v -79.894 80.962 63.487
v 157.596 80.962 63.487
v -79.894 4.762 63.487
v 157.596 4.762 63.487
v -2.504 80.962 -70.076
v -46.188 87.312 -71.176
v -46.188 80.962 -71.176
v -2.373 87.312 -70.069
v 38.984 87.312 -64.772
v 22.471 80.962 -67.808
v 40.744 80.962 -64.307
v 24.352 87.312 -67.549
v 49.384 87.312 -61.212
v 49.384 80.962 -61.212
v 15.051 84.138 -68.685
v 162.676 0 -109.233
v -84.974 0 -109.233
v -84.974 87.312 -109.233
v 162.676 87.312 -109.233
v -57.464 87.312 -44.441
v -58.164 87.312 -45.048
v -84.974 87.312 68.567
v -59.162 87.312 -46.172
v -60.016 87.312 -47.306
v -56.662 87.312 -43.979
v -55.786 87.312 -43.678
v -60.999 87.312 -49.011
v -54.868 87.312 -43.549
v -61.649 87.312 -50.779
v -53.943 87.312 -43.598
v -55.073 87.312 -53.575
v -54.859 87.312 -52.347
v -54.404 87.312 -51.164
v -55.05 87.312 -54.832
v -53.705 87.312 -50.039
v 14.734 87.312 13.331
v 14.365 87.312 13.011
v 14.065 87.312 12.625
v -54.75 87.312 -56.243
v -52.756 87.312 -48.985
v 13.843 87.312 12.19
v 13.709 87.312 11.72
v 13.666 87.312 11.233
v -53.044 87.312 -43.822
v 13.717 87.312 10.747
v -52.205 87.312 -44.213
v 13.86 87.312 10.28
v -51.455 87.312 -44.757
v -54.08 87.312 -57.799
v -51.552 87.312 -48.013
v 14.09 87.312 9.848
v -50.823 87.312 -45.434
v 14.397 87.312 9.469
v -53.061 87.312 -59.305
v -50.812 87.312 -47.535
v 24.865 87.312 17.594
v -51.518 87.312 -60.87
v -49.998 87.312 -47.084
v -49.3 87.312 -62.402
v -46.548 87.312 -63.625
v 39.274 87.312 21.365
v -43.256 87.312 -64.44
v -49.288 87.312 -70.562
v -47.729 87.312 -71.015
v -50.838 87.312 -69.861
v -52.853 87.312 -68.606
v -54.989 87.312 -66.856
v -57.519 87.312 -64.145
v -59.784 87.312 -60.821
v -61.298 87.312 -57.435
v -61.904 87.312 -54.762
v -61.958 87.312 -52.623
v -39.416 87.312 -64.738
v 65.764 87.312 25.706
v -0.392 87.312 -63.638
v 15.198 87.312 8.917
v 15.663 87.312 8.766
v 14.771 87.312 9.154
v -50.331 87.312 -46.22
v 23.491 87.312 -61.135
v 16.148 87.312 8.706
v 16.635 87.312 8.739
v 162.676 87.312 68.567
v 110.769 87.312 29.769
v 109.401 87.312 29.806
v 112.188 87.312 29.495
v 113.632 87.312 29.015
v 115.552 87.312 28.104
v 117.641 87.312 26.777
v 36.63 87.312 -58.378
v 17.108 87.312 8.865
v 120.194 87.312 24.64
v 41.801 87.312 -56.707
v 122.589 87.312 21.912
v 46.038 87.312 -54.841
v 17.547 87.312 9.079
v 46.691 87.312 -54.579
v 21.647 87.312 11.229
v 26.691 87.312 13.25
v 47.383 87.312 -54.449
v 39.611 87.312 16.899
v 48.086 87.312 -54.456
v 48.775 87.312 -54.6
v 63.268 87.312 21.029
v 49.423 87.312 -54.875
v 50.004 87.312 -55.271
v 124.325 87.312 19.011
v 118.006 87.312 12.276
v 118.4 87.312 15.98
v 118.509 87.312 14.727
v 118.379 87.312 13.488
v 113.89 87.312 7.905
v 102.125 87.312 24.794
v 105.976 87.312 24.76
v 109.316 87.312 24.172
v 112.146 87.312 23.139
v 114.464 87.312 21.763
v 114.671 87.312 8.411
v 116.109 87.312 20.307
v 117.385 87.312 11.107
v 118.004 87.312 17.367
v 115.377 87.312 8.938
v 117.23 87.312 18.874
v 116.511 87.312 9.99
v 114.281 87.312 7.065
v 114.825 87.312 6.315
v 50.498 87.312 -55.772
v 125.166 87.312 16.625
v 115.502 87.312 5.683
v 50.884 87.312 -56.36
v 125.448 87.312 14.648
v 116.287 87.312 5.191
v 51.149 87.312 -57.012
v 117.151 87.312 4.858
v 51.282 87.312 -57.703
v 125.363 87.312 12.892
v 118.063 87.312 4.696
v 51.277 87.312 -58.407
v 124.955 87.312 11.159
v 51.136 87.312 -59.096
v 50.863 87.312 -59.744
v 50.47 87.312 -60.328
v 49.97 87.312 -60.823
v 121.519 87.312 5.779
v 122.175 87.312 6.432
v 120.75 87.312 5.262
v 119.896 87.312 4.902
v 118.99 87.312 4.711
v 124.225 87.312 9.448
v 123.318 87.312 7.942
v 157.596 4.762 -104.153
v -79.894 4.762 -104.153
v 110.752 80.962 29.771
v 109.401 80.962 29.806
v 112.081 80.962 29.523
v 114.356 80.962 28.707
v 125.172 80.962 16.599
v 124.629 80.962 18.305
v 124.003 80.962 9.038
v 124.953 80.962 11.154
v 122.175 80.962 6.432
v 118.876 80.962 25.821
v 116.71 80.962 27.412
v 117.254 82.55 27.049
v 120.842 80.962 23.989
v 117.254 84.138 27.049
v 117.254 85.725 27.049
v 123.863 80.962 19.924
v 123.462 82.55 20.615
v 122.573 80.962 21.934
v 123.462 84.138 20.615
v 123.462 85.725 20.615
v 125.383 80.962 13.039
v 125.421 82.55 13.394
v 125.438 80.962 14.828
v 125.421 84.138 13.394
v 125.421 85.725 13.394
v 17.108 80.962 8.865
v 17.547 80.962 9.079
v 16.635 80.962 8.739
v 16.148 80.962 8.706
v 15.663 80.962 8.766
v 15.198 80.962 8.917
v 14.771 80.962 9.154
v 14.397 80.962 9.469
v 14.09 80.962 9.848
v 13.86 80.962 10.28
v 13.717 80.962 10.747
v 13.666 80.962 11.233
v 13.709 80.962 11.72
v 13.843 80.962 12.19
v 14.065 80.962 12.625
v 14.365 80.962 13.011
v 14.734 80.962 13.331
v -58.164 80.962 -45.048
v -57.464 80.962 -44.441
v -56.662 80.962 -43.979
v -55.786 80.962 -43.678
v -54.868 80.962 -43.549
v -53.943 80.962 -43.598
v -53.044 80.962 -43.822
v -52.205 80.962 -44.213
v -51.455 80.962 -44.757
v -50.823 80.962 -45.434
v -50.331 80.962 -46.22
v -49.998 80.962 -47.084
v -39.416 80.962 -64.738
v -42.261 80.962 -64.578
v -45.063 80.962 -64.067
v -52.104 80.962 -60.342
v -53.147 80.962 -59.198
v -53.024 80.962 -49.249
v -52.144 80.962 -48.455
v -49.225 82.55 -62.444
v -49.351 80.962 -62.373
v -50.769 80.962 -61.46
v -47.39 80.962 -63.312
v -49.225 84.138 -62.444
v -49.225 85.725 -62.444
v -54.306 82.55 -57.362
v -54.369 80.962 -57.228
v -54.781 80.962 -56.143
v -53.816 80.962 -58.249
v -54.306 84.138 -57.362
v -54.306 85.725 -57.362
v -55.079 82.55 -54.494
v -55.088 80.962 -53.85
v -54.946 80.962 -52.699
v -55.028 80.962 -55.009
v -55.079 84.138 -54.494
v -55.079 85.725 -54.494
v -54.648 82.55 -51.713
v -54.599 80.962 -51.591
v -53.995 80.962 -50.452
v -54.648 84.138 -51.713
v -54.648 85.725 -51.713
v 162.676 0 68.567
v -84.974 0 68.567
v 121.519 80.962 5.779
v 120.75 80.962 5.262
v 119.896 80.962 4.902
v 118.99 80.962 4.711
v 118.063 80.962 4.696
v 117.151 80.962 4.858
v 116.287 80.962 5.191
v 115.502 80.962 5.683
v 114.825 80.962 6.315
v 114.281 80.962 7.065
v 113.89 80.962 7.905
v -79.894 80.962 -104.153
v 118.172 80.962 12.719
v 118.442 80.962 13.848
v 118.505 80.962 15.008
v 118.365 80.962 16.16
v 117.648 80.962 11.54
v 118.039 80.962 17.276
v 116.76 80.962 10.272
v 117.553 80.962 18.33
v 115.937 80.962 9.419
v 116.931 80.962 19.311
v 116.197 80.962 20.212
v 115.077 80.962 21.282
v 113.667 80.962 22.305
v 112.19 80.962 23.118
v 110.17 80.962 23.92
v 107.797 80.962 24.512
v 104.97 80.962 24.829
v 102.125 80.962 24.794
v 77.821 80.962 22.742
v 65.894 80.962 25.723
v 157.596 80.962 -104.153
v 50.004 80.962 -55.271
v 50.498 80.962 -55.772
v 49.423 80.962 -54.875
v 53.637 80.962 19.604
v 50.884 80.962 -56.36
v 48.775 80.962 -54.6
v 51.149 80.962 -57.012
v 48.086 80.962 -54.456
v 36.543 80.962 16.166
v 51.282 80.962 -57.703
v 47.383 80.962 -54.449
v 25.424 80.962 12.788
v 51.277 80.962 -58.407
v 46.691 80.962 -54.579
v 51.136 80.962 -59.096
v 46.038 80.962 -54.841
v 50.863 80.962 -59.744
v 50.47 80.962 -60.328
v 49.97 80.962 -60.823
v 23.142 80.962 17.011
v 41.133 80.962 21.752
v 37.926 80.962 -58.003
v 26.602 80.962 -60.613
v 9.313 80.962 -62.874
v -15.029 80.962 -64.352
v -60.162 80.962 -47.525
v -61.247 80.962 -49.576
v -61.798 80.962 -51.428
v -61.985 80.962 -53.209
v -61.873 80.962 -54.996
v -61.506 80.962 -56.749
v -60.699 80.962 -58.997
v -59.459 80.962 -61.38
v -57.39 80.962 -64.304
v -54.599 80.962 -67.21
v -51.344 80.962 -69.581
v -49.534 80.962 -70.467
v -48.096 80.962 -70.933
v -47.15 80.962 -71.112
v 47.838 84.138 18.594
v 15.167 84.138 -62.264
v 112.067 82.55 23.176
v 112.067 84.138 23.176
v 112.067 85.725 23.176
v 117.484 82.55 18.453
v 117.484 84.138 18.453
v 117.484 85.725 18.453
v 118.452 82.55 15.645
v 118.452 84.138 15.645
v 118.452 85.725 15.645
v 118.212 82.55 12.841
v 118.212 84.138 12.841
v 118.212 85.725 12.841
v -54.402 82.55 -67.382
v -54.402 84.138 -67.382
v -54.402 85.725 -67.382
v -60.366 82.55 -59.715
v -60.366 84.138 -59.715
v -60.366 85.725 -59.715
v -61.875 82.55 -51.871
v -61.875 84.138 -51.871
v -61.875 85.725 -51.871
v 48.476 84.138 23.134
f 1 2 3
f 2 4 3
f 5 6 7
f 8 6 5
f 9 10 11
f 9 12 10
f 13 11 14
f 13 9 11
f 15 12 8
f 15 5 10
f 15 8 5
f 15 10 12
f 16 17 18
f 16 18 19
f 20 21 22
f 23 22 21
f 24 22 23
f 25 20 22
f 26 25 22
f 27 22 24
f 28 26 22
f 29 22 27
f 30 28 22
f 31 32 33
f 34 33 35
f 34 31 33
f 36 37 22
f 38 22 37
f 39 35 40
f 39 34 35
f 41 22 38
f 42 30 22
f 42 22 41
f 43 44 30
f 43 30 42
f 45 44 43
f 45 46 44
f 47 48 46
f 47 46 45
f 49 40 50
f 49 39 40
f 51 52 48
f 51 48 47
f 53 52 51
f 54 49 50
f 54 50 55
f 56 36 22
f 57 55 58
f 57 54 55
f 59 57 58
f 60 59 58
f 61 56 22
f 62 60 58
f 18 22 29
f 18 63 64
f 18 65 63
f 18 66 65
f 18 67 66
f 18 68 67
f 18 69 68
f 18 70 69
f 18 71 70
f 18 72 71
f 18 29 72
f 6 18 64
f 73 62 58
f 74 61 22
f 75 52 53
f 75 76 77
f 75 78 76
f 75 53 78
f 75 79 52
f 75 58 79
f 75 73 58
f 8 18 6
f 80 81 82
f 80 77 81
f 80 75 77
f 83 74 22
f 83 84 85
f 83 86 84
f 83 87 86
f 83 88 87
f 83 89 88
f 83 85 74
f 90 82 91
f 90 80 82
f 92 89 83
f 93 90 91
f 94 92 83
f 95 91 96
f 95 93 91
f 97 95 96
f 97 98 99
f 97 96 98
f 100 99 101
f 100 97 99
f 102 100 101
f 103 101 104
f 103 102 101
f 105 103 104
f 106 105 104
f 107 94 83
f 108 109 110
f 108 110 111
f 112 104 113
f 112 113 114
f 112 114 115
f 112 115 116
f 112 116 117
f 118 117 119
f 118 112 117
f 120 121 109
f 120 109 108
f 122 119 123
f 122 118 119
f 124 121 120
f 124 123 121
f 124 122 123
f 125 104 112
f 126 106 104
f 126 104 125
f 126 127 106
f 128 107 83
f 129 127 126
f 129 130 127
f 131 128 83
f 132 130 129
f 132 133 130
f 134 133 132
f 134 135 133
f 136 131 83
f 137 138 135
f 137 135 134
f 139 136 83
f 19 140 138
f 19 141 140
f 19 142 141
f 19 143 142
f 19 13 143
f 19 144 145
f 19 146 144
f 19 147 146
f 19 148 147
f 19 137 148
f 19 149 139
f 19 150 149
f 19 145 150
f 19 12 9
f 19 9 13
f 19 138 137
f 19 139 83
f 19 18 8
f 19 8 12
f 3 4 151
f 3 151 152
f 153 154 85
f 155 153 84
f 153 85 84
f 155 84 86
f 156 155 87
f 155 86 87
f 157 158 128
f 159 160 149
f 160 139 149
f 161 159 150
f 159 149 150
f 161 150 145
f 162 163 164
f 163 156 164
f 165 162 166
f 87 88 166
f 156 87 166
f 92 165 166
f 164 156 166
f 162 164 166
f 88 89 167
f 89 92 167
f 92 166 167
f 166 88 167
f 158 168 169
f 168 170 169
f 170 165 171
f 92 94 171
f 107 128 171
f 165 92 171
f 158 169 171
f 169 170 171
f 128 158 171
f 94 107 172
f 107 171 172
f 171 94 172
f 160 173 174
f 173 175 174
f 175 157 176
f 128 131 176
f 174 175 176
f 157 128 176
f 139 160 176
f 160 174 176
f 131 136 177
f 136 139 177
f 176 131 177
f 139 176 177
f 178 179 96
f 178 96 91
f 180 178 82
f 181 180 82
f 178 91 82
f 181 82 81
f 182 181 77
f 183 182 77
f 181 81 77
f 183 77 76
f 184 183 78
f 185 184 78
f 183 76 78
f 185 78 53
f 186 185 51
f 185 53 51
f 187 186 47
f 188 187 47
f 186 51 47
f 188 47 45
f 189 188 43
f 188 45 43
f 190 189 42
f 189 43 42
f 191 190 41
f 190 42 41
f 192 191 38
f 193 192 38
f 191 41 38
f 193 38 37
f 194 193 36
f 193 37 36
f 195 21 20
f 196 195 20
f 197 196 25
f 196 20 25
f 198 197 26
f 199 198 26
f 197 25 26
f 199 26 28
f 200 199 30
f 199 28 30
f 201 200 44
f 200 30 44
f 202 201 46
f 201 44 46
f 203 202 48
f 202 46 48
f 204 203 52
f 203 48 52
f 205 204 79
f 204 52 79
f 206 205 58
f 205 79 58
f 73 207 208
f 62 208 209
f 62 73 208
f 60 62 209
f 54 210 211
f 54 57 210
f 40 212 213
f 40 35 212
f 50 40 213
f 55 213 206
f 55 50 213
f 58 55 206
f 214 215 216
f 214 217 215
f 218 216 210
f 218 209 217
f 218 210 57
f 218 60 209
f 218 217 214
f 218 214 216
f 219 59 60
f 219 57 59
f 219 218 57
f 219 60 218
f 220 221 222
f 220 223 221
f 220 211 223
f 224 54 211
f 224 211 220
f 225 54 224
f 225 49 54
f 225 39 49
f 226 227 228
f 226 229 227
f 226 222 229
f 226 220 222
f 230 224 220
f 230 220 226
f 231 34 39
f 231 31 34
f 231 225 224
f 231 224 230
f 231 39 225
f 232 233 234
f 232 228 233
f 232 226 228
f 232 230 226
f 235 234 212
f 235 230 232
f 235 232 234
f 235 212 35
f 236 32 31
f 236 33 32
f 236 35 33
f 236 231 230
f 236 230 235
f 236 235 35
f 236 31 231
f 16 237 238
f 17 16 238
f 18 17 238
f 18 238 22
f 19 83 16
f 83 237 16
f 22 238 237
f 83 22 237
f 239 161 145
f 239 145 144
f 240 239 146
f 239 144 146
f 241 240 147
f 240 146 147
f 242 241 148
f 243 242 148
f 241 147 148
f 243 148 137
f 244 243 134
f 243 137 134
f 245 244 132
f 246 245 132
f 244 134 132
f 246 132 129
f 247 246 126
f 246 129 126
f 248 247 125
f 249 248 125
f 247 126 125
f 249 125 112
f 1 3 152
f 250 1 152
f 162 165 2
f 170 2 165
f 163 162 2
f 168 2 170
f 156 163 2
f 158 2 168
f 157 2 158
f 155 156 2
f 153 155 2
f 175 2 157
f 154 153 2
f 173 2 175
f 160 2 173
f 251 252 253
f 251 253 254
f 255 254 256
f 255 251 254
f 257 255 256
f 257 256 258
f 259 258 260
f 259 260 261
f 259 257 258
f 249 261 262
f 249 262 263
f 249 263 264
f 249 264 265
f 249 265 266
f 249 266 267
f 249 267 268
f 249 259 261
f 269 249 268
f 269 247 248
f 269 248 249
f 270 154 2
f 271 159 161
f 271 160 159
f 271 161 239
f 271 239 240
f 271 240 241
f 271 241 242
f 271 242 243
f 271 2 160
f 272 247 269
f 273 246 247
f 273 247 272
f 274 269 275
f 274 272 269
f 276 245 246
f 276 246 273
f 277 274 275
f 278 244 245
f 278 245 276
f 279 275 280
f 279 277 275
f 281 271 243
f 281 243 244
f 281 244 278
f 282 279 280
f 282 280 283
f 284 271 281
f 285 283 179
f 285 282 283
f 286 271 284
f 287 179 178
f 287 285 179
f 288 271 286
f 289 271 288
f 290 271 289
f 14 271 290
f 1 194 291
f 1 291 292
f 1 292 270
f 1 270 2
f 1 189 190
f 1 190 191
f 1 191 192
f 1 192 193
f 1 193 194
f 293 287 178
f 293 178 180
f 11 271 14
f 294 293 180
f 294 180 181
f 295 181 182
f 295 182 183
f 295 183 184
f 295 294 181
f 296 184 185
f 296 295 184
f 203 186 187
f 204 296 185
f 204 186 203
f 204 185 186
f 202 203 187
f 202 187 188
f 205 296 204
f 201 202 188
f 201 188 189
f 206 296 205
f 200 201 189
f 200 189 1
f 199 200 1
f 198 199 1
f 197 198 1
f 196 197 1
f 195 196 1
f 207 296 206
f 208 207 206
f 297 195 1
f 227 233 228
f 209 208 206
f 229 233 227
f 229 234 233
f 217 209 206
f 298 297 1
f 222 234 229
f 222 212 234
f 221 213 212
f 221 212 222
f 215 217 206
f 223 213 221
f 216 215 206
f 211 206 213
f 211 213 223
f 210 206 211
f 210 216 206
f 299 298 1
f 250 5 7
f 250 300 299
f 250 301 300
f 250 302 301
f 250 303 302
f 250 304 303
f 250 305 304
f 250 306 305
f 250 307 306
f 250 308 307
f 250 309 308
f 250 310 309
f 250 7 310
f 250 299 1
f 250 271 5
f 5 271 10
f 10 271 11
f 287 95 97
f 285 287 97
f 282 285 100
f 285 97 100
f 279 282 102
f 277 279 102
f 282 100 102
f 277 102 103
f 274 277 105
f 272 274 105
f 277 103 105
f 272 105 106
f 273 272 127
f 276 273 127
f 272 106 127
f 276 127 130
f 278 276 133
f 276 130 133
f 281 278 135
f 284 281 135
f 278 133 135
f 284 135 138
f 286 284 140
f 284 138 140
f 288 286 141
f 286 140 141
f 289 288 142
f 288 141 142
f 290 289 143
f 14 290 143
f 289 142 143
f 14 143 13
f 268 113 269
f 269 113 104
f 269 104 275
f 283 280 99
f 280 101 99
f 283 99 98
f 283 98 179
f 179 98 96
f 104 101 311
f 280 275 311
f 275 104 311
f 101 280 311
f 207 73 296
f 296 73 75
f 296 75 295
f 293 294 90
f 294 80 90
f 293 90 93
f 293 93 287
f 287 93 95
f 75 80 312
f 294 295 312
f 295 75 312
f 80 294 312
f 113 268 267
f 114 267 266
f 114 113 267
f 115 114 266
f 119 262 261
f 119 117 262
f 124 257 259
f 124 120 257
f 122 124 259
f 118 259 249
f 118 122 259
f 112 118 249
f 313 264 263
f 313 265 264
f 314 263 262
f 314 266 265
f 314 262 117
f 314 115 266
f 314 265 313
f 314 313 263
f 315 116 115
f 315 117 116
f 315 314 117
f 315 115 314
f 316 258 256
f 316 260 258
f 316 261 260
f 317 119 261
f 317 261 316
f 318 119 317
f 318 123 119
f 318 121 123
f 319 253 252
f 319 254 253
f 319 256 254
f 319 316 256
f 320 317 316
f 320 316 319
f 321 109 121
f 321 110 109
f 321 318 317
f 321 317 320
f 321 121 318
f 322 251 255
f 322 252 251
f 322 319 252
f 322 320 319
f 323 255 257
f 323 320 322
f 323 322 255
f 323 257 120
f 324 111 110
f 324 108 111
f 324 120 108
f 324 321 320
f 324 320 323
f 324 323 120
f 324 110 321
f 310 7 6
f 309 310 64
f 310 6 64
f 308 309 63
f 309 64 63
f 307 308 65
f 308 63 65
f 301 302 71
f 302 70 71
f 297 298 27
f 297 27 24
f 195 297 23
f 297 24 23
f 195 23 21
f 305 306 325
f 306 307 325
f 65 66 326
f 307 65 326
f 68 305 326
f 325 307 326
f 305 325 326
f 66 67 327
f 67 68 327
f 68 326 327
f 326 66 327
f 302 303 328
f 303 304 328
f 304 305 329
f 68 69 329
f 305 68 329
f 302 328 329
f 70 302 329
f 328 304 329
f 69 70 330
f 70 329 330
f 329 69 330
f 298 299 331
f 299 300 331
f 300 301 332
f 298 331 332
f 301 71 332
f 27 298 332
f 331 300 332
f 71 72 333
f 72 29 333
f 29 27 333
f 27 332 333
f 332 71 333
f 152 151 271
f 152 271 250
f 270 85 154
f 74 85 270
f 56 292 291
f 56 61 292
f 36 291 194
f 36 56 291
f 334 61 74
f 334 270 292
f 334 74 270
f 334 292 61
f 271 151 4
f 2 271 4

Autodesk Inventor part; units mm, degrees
ref_plane "YZ Plane" through (0, 0, 0) normal (1, 0, 0) x (0, 1, 0)
ref_plane "XZ Plane" through (0, 0, 0) normal (0, 1, 0) x (-1, 0, 0)
sketch "Sketch1" plane through (0, 0, 0) normal (0, 1, 0) x (-1, 0, 0)
  line L0 (84.9737, 68.5674) -> (-162.6763, 68.5674)
  line L1 (-162.6763, 68.5674) -> (-162.6763, -109.2326)
  line L2 (-162.6763, -109.2326) -> (84.9737, -109.2326)
  line L3 (84.9737, -109.2326) -> (84.9737, 68.5674)
  point P0 (0, 0)
  dimension "d0" = 247.65
  dimension "d1" = 177.8
extrude "Extrusion1" add sketch "Sketch1" along normal blind 4.7625
sketch "Sketch2" plane through (0, 4.7625, 0) normal (0, 1, 0) x (1, 0, 0)
  line L0 (-84.9737, 109.2326) -> (-84.9737, -68.5674) projected
  line L1 (162.6763, -68.5674) -> (162.6763, 109.2326) projected
  line L2 (-84.9737, -68.5674) -> (162.6763, -68.5674)
  line L3 (162.6763, -68.5674) -> (162.6763, -63.4874)
  line L4 (162.6763, -63.4874) -> (-84.9737, -63.4874)
  line L5 (-84.9737, -63.4874) -> (-84.9737, -68.5674)
  point P0 (0, 0)
  point P1 (-84.9737, -63.4874)
  dimension "d4" = 5.08
extrude "Extrusion2" add sketch "Sketch2" along normal blind 82.55
sketch "Sketch3" plane through (0, 4.7625, 0) normal (0, 1, 0) x (1, 0, 0)
  line L0 (-84.9737, 109.2326) -> (-84.9737, -68.5674) projected
  line L1 (162.6763, -68.5674) -> (162.6763, 109.2326) projected
  line L2 (-84.9737, 109.2326) -> (162.6763, 109.2326)
  line L3 (162.6763, 109.2326) -> (162.6763, 104.1526)
  line L4 (162.6763, 104.1526) -> (-84.9737, 104.1526)
  line L5 (-84.9737, 104.1526) -> (-84.9737, 109.2326)
  point P0 (0, 0)
  point P1 (-84.9737, 104.1526)
  dimension "d7" = 5.08
extrude "Extrusion3" add sketch "Sketch3" along normal blind 82.55
sketch "Sketch4" plane through (0, 4.7625, 0) normal (0, 1, 0) x (1, 0, 0)
  line L0 (-84.9737, -68.5674) -> (162.6763, -68.5674) projected
  line L1 (162.6763, 109.2326) -> (-84.9737, 109.2326) projected
  line L2 (-84.9737, -68.5674) -> (-79.8937, -68.5674)
  line L3 (-79.8937, -68.5674) -> (-79.8937, 109.2326)
  line L4 (-79.8937, 109.2326) -> (-84.9737, 109.2326)
  line L5 (-84.9737, 109.2326) -> (-84.9737, -68.5674)
  line L6 (162.6763, -68.5674) -> (157.5963, -68.5674)
  line L7 (157.5963, -68.5674) -> (157.5963, 109.2326)
  line L8 (157.5963, 109.2326) -> (162.6763, 109.2326)
  line L9 (162.6763, 109.2326) -> (162.6763, -68.5674)
  point P0 (0, 0)
  dimension "d10" = 5.08
  dimension "d11" = 5.08
extrude "Extrusion4" add sketch "Sketch4" along normal blind 82.55 contours L5 L1 L3 L0
sketch "Sketch5" plane through (0, 4.7625, 0) normal (0, 1, 0) x (1, 0, 0)
  line L0 (162.6763, 109.2326) -> (-84.9737, 109.2326) projected
  line L1 (-84.9737, -68.5674) -> (162.6763, -68.5674) projected
  line L2 (162.6763, 109.2326) -> (157.5963, 109.2326)
  line L3 (157.5963, 109.2326) -> (157.5963, -68.5674)
  line L4 (157.5963, -68.5674) -> (162.6763, -68.5674)
  line L5 (162.6763, -68.5674) -> (162.6763, 109.2326)
  point P0 (0, 0)
  dimension "d14" = 5.08
extrude "Extrusion5" add sketch "Sketch5" along normal blind 82.55
sketch "Sketch6" plane through (-79.8937, 4.7625, -104.1526) normal (0, 0, 1) x (1, 0, 0)
  line L0 (-5.08, -4.7625) -> (-5.08, 82.55) projected
  line L1 (242.57, -4.7625) -> (242.57, 82.55) projected
  line L2 (-5.08, 82.55) -> (242.57, 82.55)
  line L3 (242.57, 82.55) -> (242.57, 76.2)
  line L4 (242.57, 76.2) -> (-5.08, 76.2)
  line L5 (-5.08, 76.2) -> (-5.08, 82.55)
  point P0 (79.8937, -4.7625)
  dimension "d17" = 6.35
extrude "Extrusion6" add sketch "Sketch6" along normal blind 167.64
sketch "Sketch7" plane through (0, 0, 0) normal (0, -1, 0) x (1, 0, 0)
  point P0 (0, 0)
ref_plane "Work Plane1" through (0, 87.3125, 0) normal (0, 1, 0) x (1, 0, 0)
sketch "Sketch10" plane through (0, 87.3125, 0) normal (0, 1, 0) x (1, 0, 0)
  line L0 (-39.4156, 64.7377) -> (-51.6456, 64.7377) construction
  spline S0 degree 4 poles (-39.4156, 64.7377) (-51.6456, 64.7377) (-57.2894, 57.2798) (-57.2894, 50.8338) (-49.9984, 47.0841) knots 1 1 1 1 1 2 2 2 2 2
  line L1 (-51.6456, 64.7377) -> (-57.2894, 57.2798) construction
  line L2 (-57.2894, 57.2798) -> (-57.2894, 50.8338) construction
  line L3 (-57.2894, 50.8338) -> (-49.9984, 47.0841) construction
  line L4 (-46.1883, 71.1757) -> (-54.4299, 71.1757) construction
  spline S1 degree 4 poles (-46.1883, 71.1757) (-54.4299, 71.1757) (-64.3781, 58.0298) (-64.3781, 51.5837) (-58.1641, 45.0485) knots 1 1 1 1 1 2 2 2 2 2
  line L5 (-54.4299, 71.1757) -> (-64.3781, 58.0298) construction
  line L6 (-64.3781, 58.0298) -> (-64.3781, 51.5837) construction
  line L7 (-64.3781, 51.5837) -> (-58.1641, 45.0485) construction
  line L8 (-39.4156, 64.7377) -> (27.0232, 64.7377) construction
  spline S2 degree 2 poles (-39.4156, 64.7377) (27.0232, 64.7377) (46.0385, 54.8414) knots 1 1 1 2 2 2
  line L9 (27.0232, 64.7377) -> (46.0385, 54.8414) construction
  spline S3 degree 2 poles (-46.1883, 71.1757) (28.5034, 71.1757) (49.3836, 61.2115) knots 1 1 1 2 2 2
  line L10 (-46.1883, 71.1757) -> (28.5034, 71.1757) construction
  line L11 (28.5034, 71.1757) -> (49.3836, 61.2115) construction
  arc A0 (-58.1641, 45.0485) -> (-49.9984, 47.0841) centre (-54.6585, 48.3817) ccw
  arc A1 (46.0385, 54.8414) -> (49.3836, 61.2115) centre (47.6993, 58.0326) ccw
  line L12 (102.1246, -24.7938) -> (35.8412, -20.2518) construction
  spline S4 degree 2 poles (102.1246, -24.7938) (35.8412, -20.2518) (17.547, -9.0787) knots 1 1 1 2 2 2
  line L13 (35.8412, -20.2518) -> (17.547, -9.0787) construction
  spline S5 degree 2 poles (109.401, -29.8059) (34.884, -24.6997) (14.7339, -13.3314) knots 1 1 1 2 2 2
  line L14 (109.401, -29.8059) -> (34.884, -24.6997) construction
  line L15 (34.884, -24.6997) -> (14.7339, -13.3314) construction
  line L16 (120.9071, -12.1443) -> (113.8896, -7.905) construction
  spline S6 degree 4 poles (102.1246, -24.7938) (114.326, -25.6299) (120.4665, -18.5753) (120.9071, -12.1443) (113.8896, -7.905) knots 1 1 1 1 1 2 2 2 2 2
  line L17 (102.1246, -24.7938) -> (114.326, -25.6299) construction
  line L18 (114.326, -25.6299) -> (120.4665, -18.5753) construction
  line L19 (120.4665, -18.5753) -> (120.9071, -12.1443) construction
  line L20 (127.928, -13.3771) -> (122.1753, -6.4323) construction
  spline S7 degree 4 poles (109.401, -29.8059) (116.796, -30.3126) (127.4874, -19.8081) (127.928, -13.3771) (122.1753, -6.4323) knots 1 1 1 1 1 2 2 2 2 2
  line L21 (109.401, -29.8059) -> (116.796, -30.3126) construction
  line L22 (116.796, -30.3126) -> (127.4874, -19.8081) construction
  line L23 (127.4874, -19.8081) -> (127.928, -13.3771) construction
  arc A2 (122.1753, -6.4323) -> (113.8896, -7.905) centre (118.45, -9.5182) ccw
  arc A3 (17.547, -9.0787) -> (14.7339, -13.3314) centre (16.2173, -11.2559) ccw
  point P0 (0, 0)
  point P1 (0, 194.8532)
extrude "Extrusion9" cut sketch "Sketch10" against normal blind 25.4
properties part number "CigarBox" material "Wood (Maple)"
